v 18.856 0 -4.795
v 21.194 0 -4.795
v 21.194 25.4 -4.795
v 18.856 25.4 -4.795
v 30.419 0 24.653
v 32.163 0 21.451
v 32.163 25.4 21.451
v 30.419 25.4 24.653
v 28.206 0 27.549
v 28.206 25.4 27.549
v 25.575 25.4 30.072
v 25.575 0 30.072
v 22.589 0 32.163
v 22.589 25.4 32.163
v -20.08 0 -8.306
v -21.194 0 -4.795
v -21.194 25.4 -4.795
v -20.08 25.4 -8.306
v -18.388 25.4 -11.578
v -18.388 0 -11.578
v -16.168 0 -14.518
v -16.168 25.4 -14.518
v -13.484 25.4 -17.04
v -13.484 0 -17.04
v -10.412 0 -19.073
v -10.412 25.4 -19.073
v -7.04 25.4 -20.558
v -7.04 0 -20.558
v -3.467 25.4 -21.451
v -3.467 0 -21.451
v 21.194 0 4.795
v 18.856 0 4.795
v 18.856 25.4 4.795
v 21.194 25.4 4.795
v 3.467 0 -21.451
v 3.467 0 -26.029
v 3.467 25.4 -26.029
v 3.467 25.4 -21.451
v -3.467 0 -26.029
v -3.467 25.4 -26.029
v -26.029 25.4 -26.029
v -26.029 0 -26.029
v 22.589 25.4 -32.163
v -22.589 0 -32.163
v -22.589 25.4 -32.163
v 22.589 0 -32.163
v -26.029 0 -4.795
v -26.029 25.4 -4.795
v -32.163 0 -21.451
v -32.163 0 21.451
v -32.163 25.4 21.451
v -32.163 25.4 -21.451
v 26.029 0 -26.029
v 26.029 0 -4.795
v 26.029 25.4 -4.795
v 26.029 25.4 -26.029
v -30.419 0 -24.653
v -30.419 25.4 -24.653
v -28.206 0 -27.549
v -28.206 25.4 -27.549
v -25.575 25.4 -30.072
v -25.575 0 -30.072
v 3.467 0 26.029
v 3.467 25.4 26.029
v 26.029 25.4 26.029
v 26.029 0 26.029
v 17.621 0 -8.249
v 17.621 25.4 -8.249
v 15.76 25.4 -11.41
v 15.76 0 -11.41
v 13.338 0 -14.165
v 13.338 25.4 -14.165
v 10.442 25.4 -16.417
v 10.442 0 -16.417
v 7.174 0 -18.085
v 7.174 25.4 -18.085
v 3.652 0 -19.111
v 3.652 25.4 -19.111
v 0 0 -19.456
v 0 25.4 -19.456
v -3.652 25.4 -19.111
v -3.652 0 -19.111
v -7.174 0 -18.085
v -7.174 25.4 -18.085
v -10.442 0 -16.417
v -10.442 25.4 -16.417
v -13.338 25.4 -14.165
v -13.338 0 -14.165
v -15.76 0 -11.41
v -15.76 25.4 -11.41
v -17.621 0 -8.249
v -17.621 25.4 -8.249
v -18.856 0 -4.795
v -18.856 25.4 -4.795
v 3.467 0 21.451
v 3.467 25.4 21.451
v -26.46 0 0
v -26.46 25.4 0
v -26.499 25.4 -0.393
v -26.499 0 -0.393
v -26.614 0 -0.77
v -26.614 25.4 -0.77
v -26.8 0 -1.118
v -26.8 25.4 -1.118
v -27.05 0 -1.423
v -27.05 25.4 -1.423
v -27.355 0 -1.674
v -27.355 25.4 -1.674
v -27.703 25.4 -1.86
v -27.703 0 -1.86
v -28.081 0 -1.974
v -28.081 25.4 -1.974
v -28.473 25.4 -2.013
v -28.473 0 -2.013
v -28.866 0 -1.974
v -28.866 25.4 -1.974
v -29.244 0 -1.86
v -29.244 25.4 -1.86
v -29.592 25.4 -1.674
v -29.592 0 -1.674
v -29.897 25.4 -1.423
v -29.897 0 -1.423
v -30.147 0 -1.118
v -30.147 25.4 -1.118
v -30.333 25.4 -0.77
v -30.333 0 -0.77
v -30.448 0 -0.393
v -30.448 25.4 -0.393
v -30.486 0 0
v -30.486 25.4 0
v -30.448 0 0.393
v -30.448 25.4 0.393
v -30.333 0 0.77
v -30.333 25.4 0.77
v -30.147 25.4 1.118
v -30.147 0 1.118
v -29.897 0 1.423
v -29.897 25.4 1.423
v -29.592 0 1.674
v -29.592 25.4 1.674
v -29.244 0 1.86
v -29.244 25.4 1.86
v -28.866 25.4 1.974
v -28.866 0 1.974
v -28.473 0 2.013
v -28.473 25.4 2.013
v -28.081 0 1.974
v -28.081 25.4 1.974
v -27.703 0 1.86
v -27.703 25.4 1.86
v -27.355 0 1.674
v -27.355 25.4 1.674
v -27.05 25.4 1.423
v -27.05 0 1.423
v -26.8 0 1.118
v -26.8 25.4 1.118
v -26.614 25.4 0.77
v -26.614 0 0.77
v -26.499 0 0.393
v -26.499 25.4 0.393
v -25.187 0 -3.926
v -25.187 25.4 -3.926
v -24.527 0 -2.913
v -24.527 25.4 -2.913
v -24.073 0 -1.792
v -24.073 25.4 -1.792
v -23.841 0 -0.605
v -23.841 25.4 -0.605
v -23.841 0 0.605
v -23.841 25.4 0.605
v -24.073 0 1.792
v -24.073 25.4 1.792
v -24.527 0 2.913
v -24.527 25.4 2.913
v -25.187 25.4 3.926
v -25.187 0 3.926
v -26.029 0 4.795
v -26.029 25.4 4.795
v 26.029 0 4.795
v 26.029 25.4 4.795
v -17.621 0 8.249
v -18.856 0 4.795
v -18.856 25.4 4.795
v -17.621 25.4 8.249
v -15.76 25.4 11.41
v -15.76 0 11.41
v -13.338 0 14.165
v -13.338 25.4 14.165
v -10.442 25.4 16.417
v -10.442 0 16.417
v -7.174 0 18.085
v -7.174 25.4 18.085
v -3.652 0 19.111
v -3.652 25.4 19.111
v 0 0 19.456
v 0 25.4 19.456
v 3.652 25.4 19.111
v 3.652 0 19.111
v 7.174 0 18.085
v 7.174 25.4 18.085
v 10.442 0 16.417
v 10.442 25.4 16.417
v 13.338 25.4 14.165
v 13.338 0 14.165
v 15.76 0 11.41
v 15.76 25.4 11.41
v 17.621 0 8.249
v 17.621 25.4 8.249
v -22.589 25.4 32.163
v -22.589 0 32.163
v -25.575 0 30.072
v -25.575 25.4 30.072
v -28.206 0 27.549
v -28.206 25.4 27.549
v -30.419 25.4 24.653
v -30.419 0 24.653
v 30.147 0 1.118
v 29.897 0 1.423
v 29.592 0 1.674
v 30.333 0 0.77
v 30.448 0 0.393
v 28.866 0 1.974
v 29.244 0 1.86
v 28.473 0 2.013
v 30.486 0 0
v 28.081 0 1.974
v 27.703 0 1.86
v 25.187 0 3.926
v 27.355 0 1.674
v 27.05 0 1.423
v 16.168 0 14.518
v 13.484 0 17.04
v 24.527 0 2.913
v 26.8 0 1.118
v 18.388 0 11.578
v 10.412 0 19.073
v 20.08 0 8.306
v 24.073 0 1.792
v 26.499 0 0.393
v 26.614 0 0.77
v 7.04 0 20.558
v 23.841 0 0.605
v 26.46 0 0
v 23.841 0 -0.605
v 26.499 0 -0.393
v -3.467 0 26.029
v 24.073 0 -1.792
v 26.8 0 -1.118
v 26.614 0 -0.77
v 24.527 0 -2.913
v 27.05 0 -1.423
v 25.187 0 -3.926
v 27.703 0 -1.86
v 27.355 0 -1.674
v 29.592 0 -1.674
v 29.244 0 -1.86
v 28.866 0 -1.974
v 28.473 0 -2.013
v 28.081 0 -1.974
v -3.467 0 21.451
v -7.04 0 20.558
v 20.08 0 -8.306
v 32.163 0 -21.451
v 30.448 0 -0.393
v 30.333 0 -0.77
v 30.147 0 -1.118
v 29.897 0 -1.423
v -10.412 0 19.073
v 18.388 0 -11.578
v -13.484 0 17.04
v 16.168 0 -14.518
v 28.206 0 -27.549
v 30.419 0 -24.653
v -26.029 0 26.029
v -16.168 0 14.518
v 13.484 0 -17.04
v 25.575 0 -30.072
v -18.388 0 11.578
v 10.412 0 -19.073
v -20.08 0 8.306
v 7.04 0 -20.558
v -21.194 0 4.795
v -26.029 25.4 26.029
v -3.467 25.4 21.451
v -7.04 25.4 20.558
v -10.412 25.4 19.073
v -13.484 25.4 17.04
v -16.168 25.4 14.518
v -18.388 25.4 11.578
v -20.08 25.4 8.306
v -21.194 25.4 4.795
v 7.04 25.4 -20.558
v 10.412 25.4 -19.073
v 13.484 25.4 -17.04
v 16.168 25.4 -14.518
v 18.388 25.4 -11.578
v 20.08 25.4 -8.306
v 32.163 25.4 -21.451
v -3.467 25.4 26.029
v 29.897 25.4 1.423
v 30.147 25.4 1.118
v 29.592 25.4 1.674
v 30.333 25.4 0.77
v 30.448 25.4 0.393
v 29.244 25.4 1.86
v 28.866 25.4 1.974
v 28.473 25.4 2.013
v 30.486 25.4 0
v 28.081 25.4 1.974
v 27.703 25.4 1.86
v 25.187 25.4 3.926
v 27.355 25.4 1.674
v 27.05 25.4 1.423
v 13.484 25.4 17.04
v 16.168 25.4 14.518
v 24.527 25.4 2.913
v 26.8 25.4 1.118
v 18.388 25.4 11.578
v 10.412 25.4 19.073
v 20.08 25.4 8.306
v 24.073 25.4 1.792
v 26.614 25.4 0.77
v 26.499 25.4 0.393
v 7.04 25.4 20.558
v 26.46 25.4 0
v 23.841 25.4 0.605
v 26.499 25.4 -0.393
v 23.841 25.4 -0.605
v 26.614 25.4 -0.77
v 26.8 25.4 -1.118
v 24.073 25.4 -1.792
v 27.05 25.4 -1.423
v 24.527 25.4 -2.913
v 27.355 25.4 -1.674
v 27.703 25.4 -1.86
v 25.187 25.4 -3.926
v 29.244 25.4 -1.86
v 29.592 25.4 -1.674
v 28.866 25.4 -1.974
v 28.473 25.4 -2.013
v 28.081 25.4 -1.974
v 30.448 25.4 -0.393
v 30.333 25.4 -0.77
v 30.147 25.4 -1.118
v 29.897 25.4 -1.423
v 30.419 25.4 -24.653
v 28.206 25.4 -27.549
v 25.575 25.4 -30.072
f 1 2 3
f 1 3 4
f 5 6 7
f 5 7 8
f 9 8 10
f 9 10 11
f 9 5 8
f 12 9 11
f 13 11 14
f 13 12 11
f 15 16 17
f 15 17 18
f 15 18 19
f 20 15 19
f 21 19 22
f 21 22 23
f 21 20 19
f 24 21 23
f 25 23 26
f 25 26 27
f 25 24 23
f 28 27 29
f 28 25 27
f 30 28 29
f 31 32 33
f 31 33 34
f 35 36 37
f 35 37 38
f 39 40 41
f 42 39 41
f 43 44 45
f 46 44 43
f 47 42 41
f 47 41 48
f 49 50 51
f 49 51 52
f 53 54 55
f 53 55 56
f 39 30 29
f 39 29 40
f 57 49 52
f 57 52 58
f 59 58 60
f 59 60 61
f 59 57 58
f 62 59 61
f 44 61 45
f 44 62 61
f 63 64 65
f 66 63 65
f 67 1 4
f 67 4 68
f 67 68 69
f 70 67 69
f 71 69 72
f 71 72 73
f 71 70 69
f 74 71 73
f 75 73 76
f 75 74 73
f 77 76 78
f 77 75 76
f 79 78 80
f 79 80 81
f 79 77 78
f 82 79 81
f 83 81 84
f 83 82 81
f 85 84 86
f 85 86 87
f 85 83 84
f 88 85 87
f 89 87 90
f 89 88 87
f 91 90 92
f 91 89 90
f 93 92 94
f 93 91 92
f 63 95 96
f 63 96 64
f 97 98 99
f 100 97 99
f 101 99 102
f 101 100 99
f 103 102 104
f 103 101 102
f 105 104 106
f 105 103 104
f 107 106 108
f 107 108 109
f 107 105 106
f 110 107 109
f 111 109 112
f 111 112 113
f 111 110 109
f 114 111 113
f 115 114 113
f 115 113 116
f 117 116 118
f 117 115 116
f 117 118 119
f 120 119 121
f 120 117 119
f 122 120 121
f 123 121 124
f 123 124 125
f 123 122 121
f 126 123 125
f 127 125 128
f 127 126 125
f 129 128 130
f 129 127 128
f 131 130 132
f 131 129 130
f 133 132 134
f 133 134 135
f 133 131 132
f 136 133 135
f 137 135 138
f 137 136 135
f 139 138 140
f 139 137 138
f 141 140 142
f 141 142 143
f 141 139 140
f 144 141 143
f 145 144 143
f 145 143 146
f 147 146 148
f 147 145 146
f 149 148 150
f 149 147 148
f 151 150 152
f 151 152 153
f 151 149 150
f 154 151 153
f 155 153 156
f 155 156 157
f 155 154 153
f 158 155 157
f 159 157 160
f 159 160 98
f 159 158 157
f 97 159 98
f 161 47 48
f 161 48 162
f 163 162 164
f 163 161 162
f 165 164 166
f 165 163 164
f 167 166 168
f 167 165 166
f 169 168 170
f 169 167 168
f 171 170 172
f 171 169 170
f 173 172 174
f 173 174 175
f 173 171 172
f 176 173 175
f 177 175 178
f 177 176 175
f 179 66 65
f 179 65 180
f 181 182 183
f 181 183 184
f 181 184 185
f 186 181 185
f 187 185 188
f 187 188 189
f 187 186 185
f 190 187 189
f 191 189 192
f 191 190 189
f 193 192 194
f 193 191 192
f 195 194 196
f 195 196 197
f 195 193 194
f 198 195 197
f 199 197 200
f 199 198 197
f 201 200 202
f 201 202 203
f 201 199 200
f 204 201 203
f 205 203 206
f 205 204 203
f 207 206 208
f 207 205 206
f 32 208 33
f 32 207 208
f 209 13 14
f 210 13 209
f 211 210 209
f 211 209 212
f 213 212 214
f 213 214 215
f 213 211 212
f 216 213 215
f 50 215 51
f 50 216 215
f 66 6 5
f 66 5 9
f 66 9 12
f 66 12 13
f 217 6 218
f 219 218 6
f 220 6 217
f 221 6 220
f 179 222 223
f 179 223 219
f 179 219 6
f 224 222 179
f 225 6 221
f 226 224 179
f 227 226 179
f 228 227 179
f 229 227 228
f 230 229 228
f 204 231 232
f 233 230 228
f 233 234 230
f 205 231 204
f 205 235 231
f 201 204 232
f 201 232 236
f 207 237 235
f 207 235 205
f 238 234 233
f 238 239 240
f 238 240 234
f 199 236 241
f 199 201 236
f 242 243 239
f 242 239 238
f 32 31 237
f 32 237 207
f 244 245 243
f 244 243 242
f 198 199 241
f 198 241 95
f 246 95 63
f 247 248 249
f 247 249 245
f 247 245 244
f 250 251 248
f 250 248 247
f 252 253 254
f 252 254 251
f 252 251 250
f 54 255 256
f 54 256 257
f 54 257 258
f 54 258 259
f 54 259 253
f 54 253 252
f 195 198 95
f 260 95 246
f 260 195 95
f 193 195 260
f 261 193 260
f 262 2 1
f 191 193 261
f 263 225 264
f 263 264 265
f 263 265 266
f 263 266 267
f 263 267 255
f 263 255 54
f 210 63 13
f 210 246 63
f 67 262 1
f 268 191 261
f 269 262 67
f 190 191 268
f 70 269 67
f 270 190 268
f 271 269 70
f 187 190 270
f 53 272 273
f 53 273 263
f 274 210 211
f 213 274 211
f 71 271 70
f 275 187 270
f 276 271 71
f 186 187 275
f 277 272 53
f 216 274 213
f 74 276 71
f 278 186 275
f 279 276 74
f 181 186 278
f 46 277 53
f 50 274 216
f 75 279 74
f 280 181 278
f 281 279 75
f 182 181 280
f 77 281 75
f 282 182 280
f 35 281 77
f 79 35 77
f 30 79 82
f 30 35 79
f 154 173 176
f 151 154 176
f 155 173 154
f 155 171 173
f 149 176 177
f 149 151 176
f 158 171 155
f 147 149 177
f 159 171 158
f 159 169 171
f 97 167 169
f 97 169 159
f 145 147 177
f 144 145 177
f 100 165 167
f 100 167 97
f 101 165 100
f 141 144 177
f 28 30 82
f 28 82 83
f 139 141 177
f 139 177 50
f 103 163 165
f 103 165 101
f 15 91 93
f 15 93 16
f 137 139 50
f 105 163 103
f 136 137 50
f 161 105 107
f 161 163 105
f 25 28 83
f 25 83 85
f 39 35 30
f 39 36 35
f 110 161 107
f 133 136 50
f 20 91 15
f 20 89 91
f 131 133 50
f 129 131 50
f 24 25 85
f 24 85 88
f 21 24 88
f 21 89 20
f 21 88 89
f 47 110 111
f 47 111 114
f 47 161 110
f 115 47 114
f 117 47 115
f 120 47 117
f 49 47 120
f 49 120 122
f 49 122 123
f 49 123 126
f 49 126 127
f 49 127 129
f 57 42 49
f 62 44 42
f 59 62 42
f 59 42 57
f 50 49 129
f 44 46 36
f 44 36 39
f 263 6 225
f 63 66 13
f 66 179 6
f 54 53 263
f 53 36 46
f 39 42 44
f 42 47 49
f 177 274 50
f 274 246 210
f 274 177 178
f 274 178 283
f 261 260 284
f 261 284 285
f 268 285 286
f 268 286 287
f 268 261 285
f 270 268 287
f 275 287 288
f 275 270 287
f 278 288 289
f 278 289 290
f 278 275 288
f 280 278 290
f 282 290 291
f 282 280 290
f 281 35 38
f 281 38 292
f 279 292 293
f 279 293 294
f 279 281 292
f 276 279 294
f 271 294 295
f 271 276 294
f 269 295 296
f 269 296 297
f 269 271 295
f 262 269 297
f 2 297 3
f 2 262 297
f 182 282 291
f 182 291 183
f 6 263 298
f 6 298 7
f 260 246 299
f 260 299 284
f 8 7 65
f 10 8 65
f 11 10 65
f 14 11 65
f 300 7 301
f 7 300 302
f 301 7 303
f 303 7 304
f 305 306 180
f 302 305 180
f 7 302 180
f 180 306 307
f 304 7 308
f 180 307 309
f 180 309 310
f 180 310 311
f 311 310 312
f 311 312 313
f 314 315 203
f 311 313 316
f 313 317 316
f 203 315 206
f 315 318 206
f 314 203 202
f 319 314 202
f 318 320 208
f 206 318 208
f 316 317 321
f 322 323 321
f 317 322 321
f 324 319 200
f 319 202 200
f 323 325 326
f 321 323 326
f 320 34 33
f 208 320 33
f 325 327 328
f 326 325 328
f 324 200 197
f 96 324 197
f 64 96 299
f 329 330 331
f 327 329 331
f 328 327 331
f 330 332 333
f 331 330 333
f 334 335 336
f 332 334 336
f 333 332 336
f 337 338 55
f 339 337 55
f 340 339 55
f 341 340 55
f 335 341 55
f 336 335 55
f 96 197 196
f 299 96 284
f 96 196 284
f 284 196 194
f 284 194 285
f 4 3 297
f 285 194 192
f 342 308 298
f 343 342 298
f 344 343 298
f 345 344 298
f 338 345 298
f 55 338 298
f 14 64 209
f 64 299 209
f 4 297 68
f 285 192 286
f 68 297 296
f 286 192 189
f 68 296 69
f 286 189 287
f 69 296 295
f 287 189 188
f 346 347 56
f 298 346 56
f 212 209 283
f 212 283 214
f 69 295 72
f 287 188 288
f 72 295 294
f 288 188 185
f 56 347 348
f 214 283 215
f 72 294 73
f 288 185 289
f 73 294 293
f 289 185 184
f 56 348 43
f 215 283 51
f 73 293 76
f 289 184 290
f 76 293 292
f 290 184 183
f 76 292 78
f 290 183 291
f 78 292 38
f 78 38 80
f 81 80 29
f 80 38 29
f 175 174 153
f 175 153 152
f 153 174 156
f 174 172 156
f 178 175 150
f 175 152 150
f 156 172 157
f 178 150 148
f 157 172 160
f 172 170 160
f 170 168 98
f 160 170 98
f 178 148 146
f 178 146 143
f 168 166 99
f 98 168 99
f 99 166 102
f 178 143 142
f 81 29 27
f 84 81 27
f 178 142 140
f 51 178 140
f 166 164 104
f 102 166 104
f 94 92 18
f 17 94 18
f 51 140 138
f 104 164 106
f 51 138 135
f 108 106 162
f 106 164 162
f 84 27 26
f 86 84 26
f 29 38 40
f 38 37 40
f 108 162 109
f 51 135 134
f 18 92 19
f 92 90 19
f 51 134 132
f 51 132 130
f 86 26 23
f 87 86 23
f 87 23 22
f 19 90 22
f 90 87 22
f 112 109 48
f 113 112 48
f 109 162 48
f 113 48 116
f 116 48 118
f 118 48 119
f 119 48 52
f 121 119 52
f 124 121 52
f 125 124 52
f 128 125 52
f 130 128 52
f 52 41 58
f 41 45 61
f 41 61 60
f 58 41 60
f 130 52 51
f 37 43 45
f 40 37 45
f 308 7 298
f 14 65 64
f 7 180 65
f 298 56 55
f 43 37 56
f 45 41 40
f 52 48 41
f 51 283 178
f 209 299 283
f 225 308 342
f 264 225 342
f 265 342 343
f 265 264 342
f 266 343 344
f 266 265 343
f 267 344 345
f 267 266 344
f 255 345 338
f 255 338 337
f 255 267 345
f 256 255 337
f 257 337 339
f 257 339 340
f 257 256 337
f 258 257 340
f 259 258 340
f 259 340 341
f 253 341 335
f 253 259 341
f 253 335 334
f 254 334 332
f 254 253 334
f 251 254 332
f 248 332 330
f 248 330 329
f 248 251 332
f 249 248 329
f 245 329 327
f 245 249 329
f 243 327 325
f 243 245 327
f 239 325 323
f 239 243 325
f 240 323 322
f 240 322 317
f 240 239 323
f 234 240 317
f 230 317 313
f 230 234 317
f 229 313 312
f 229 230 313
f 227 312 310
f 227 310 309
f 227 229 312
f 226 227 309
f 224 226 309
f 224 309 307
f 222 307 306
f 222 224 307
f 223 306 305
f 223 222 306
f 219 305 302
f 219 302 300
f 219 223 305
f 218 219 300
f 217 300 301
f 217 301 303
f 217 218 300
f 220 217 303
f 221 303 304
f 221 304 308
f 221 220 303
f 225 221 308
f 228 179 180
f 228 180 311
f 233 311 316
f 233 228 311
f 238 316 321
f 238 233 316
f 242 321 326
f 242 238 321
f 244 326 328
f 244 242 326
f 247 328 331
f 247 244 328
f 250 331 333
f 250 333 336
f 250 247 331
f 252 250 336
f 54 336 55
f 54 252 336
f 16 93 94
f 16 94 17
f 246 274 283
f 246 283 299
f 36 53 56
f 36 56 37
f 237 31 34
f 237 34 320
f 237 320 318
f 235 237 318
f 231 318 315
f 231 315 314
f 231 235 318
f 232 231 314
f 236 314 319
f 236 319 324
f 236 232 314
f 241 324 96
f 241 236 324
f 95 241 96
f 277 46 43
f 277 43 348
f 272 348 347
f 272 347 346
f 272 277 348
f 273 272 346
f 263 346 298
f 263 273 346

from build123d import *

# Parameters (mm, degrees)
SKETCH1_R           = 2.01295
BOSS_EXTRUDE1_DEPTH = 25.4


with BuildPart() as part:
    # Sketch1 → Boss-Extrude1 (new body)
    with BuildSketch(Plane(origin=(0, 0, 0), x_dir=(1, 0, 0), z_dir=(0, 1, 0))):
        with BuildLine():
            ThreePointArc((32.16275, -21.451406337), (28.205815008, -27.54883493), (22.589075945, -32.16275))
            Line((22.589075945, -32.16275), (-22.589075945, -32.16275))
            ThreePointArc((-22.589075945, -32.16275), (-28.205815008, -27.54883493), (-32.16275, -21.451406337))
            Line((-32.16275, -21.451406337), (-32.16275, 21.451406337))
            ThreePointArc((-32.16275, 21.451406337), (-28.205815008, 27.54883493), (-22.589075945, 32.16275))
            Line((-22.589075945, 32.16275), (22.589075945, 32.16275))
            ThreePointArc((22.589075945, 32.16275), (28.205815008, 27.54883493), (32.16275, 21.451406337))
            Line((32.16275, 21.451406337), (32.16275, -21.451406337))
        make_face()
        with Locations((-28.4734, 0)):
            Circle(SKETCH1_R, mode=Mode.SUBTRACT)
        with Locations((28.4734, 0)):
            Circle(SKETCH1_R, mode=Mode.SUBTRACT)
        with BuildLine():
            Line((3.466558561, -21.451406337), (3.466558561, -26.02865))
            Line((3.466558561, -26.02865), (26.02865, -26.02865))
            Line((26.02865, -26.02865), (26.02865, -4.794756681))
            ThreePointArc((26.02865, -4.794756681), (23.812095234, 0), (26.02865, 4.794756681))
            Line((26.02865, 4.794756681), (26.02865, 26.02865))
            Line((26.02865, 26.02865), (3.466558561, 26.02865))
            Line((3.466558561, 26.02865), (3.466558561, 21.451406337))
            ThreePointArc((3.466558561, 21.451406337), (14.879452296, 15.836090473), (21.194106975, 4.794756681))
            Line((21.194106975, 4.794756681), (18.856346659, 4.794756681))
            ThreePointArc((18.856346659, 4.794756681), (0, 19.4564), (-18.856346659, 4.794756681))
            Line((-18.856346659, 4.794756681), (-21.194106975, 4.794756681))
            ThreePointArc((-21.194106975, 4.794756681), (-14.879452296, 15.836090473), (-3.466558561, 21.451406337))
            Line((-3.466558561, 21.451406337), (-3.466558561, 26.02865))
            Line((-3.466558561, 26.02865), (-26.02865, 26.02865))
            Line((-26.02865, 26.02865), (-26.02865, 4.794756681))
            ThreePointArc((-26.02865, 4.794756681), (-23.812095234, 0), (-26.02865, -4.794756681))
            Line((-26.02865, -4.794756681), (-26.02865, -26.02865))
            Line((-26.02865, -26.02865), (-3.466558561, -26.02865))
            Line((-3.466558561, -26.02865), (-3.466558561, -21.451406337))
            ThreePointArc((-3.466558561, -21.451406337), (-14.879452296, -15.836090473), (-21.194106975, -4.794756681))
            Line((-21.194106975, -4.794756681), (-18.856346659, -4.794756681))
            ThreePointArc((-18.856346659, -4.794756681), (0, -19.4564), (18.856346659, -4.794756681))
            Line((18.856346659, -4.794756681), (21.194106975, -4.794756681))
            ThreePointArc((21.194106975, -4.794756681), (14.879452296, -15.836090473), (3.466558561, -21.451406337))
        make_face(mode=Mode.SUBTRACT)
    extrude(amount=BOSS_EXTRUDE1_DEPTH)


solid = part.part
